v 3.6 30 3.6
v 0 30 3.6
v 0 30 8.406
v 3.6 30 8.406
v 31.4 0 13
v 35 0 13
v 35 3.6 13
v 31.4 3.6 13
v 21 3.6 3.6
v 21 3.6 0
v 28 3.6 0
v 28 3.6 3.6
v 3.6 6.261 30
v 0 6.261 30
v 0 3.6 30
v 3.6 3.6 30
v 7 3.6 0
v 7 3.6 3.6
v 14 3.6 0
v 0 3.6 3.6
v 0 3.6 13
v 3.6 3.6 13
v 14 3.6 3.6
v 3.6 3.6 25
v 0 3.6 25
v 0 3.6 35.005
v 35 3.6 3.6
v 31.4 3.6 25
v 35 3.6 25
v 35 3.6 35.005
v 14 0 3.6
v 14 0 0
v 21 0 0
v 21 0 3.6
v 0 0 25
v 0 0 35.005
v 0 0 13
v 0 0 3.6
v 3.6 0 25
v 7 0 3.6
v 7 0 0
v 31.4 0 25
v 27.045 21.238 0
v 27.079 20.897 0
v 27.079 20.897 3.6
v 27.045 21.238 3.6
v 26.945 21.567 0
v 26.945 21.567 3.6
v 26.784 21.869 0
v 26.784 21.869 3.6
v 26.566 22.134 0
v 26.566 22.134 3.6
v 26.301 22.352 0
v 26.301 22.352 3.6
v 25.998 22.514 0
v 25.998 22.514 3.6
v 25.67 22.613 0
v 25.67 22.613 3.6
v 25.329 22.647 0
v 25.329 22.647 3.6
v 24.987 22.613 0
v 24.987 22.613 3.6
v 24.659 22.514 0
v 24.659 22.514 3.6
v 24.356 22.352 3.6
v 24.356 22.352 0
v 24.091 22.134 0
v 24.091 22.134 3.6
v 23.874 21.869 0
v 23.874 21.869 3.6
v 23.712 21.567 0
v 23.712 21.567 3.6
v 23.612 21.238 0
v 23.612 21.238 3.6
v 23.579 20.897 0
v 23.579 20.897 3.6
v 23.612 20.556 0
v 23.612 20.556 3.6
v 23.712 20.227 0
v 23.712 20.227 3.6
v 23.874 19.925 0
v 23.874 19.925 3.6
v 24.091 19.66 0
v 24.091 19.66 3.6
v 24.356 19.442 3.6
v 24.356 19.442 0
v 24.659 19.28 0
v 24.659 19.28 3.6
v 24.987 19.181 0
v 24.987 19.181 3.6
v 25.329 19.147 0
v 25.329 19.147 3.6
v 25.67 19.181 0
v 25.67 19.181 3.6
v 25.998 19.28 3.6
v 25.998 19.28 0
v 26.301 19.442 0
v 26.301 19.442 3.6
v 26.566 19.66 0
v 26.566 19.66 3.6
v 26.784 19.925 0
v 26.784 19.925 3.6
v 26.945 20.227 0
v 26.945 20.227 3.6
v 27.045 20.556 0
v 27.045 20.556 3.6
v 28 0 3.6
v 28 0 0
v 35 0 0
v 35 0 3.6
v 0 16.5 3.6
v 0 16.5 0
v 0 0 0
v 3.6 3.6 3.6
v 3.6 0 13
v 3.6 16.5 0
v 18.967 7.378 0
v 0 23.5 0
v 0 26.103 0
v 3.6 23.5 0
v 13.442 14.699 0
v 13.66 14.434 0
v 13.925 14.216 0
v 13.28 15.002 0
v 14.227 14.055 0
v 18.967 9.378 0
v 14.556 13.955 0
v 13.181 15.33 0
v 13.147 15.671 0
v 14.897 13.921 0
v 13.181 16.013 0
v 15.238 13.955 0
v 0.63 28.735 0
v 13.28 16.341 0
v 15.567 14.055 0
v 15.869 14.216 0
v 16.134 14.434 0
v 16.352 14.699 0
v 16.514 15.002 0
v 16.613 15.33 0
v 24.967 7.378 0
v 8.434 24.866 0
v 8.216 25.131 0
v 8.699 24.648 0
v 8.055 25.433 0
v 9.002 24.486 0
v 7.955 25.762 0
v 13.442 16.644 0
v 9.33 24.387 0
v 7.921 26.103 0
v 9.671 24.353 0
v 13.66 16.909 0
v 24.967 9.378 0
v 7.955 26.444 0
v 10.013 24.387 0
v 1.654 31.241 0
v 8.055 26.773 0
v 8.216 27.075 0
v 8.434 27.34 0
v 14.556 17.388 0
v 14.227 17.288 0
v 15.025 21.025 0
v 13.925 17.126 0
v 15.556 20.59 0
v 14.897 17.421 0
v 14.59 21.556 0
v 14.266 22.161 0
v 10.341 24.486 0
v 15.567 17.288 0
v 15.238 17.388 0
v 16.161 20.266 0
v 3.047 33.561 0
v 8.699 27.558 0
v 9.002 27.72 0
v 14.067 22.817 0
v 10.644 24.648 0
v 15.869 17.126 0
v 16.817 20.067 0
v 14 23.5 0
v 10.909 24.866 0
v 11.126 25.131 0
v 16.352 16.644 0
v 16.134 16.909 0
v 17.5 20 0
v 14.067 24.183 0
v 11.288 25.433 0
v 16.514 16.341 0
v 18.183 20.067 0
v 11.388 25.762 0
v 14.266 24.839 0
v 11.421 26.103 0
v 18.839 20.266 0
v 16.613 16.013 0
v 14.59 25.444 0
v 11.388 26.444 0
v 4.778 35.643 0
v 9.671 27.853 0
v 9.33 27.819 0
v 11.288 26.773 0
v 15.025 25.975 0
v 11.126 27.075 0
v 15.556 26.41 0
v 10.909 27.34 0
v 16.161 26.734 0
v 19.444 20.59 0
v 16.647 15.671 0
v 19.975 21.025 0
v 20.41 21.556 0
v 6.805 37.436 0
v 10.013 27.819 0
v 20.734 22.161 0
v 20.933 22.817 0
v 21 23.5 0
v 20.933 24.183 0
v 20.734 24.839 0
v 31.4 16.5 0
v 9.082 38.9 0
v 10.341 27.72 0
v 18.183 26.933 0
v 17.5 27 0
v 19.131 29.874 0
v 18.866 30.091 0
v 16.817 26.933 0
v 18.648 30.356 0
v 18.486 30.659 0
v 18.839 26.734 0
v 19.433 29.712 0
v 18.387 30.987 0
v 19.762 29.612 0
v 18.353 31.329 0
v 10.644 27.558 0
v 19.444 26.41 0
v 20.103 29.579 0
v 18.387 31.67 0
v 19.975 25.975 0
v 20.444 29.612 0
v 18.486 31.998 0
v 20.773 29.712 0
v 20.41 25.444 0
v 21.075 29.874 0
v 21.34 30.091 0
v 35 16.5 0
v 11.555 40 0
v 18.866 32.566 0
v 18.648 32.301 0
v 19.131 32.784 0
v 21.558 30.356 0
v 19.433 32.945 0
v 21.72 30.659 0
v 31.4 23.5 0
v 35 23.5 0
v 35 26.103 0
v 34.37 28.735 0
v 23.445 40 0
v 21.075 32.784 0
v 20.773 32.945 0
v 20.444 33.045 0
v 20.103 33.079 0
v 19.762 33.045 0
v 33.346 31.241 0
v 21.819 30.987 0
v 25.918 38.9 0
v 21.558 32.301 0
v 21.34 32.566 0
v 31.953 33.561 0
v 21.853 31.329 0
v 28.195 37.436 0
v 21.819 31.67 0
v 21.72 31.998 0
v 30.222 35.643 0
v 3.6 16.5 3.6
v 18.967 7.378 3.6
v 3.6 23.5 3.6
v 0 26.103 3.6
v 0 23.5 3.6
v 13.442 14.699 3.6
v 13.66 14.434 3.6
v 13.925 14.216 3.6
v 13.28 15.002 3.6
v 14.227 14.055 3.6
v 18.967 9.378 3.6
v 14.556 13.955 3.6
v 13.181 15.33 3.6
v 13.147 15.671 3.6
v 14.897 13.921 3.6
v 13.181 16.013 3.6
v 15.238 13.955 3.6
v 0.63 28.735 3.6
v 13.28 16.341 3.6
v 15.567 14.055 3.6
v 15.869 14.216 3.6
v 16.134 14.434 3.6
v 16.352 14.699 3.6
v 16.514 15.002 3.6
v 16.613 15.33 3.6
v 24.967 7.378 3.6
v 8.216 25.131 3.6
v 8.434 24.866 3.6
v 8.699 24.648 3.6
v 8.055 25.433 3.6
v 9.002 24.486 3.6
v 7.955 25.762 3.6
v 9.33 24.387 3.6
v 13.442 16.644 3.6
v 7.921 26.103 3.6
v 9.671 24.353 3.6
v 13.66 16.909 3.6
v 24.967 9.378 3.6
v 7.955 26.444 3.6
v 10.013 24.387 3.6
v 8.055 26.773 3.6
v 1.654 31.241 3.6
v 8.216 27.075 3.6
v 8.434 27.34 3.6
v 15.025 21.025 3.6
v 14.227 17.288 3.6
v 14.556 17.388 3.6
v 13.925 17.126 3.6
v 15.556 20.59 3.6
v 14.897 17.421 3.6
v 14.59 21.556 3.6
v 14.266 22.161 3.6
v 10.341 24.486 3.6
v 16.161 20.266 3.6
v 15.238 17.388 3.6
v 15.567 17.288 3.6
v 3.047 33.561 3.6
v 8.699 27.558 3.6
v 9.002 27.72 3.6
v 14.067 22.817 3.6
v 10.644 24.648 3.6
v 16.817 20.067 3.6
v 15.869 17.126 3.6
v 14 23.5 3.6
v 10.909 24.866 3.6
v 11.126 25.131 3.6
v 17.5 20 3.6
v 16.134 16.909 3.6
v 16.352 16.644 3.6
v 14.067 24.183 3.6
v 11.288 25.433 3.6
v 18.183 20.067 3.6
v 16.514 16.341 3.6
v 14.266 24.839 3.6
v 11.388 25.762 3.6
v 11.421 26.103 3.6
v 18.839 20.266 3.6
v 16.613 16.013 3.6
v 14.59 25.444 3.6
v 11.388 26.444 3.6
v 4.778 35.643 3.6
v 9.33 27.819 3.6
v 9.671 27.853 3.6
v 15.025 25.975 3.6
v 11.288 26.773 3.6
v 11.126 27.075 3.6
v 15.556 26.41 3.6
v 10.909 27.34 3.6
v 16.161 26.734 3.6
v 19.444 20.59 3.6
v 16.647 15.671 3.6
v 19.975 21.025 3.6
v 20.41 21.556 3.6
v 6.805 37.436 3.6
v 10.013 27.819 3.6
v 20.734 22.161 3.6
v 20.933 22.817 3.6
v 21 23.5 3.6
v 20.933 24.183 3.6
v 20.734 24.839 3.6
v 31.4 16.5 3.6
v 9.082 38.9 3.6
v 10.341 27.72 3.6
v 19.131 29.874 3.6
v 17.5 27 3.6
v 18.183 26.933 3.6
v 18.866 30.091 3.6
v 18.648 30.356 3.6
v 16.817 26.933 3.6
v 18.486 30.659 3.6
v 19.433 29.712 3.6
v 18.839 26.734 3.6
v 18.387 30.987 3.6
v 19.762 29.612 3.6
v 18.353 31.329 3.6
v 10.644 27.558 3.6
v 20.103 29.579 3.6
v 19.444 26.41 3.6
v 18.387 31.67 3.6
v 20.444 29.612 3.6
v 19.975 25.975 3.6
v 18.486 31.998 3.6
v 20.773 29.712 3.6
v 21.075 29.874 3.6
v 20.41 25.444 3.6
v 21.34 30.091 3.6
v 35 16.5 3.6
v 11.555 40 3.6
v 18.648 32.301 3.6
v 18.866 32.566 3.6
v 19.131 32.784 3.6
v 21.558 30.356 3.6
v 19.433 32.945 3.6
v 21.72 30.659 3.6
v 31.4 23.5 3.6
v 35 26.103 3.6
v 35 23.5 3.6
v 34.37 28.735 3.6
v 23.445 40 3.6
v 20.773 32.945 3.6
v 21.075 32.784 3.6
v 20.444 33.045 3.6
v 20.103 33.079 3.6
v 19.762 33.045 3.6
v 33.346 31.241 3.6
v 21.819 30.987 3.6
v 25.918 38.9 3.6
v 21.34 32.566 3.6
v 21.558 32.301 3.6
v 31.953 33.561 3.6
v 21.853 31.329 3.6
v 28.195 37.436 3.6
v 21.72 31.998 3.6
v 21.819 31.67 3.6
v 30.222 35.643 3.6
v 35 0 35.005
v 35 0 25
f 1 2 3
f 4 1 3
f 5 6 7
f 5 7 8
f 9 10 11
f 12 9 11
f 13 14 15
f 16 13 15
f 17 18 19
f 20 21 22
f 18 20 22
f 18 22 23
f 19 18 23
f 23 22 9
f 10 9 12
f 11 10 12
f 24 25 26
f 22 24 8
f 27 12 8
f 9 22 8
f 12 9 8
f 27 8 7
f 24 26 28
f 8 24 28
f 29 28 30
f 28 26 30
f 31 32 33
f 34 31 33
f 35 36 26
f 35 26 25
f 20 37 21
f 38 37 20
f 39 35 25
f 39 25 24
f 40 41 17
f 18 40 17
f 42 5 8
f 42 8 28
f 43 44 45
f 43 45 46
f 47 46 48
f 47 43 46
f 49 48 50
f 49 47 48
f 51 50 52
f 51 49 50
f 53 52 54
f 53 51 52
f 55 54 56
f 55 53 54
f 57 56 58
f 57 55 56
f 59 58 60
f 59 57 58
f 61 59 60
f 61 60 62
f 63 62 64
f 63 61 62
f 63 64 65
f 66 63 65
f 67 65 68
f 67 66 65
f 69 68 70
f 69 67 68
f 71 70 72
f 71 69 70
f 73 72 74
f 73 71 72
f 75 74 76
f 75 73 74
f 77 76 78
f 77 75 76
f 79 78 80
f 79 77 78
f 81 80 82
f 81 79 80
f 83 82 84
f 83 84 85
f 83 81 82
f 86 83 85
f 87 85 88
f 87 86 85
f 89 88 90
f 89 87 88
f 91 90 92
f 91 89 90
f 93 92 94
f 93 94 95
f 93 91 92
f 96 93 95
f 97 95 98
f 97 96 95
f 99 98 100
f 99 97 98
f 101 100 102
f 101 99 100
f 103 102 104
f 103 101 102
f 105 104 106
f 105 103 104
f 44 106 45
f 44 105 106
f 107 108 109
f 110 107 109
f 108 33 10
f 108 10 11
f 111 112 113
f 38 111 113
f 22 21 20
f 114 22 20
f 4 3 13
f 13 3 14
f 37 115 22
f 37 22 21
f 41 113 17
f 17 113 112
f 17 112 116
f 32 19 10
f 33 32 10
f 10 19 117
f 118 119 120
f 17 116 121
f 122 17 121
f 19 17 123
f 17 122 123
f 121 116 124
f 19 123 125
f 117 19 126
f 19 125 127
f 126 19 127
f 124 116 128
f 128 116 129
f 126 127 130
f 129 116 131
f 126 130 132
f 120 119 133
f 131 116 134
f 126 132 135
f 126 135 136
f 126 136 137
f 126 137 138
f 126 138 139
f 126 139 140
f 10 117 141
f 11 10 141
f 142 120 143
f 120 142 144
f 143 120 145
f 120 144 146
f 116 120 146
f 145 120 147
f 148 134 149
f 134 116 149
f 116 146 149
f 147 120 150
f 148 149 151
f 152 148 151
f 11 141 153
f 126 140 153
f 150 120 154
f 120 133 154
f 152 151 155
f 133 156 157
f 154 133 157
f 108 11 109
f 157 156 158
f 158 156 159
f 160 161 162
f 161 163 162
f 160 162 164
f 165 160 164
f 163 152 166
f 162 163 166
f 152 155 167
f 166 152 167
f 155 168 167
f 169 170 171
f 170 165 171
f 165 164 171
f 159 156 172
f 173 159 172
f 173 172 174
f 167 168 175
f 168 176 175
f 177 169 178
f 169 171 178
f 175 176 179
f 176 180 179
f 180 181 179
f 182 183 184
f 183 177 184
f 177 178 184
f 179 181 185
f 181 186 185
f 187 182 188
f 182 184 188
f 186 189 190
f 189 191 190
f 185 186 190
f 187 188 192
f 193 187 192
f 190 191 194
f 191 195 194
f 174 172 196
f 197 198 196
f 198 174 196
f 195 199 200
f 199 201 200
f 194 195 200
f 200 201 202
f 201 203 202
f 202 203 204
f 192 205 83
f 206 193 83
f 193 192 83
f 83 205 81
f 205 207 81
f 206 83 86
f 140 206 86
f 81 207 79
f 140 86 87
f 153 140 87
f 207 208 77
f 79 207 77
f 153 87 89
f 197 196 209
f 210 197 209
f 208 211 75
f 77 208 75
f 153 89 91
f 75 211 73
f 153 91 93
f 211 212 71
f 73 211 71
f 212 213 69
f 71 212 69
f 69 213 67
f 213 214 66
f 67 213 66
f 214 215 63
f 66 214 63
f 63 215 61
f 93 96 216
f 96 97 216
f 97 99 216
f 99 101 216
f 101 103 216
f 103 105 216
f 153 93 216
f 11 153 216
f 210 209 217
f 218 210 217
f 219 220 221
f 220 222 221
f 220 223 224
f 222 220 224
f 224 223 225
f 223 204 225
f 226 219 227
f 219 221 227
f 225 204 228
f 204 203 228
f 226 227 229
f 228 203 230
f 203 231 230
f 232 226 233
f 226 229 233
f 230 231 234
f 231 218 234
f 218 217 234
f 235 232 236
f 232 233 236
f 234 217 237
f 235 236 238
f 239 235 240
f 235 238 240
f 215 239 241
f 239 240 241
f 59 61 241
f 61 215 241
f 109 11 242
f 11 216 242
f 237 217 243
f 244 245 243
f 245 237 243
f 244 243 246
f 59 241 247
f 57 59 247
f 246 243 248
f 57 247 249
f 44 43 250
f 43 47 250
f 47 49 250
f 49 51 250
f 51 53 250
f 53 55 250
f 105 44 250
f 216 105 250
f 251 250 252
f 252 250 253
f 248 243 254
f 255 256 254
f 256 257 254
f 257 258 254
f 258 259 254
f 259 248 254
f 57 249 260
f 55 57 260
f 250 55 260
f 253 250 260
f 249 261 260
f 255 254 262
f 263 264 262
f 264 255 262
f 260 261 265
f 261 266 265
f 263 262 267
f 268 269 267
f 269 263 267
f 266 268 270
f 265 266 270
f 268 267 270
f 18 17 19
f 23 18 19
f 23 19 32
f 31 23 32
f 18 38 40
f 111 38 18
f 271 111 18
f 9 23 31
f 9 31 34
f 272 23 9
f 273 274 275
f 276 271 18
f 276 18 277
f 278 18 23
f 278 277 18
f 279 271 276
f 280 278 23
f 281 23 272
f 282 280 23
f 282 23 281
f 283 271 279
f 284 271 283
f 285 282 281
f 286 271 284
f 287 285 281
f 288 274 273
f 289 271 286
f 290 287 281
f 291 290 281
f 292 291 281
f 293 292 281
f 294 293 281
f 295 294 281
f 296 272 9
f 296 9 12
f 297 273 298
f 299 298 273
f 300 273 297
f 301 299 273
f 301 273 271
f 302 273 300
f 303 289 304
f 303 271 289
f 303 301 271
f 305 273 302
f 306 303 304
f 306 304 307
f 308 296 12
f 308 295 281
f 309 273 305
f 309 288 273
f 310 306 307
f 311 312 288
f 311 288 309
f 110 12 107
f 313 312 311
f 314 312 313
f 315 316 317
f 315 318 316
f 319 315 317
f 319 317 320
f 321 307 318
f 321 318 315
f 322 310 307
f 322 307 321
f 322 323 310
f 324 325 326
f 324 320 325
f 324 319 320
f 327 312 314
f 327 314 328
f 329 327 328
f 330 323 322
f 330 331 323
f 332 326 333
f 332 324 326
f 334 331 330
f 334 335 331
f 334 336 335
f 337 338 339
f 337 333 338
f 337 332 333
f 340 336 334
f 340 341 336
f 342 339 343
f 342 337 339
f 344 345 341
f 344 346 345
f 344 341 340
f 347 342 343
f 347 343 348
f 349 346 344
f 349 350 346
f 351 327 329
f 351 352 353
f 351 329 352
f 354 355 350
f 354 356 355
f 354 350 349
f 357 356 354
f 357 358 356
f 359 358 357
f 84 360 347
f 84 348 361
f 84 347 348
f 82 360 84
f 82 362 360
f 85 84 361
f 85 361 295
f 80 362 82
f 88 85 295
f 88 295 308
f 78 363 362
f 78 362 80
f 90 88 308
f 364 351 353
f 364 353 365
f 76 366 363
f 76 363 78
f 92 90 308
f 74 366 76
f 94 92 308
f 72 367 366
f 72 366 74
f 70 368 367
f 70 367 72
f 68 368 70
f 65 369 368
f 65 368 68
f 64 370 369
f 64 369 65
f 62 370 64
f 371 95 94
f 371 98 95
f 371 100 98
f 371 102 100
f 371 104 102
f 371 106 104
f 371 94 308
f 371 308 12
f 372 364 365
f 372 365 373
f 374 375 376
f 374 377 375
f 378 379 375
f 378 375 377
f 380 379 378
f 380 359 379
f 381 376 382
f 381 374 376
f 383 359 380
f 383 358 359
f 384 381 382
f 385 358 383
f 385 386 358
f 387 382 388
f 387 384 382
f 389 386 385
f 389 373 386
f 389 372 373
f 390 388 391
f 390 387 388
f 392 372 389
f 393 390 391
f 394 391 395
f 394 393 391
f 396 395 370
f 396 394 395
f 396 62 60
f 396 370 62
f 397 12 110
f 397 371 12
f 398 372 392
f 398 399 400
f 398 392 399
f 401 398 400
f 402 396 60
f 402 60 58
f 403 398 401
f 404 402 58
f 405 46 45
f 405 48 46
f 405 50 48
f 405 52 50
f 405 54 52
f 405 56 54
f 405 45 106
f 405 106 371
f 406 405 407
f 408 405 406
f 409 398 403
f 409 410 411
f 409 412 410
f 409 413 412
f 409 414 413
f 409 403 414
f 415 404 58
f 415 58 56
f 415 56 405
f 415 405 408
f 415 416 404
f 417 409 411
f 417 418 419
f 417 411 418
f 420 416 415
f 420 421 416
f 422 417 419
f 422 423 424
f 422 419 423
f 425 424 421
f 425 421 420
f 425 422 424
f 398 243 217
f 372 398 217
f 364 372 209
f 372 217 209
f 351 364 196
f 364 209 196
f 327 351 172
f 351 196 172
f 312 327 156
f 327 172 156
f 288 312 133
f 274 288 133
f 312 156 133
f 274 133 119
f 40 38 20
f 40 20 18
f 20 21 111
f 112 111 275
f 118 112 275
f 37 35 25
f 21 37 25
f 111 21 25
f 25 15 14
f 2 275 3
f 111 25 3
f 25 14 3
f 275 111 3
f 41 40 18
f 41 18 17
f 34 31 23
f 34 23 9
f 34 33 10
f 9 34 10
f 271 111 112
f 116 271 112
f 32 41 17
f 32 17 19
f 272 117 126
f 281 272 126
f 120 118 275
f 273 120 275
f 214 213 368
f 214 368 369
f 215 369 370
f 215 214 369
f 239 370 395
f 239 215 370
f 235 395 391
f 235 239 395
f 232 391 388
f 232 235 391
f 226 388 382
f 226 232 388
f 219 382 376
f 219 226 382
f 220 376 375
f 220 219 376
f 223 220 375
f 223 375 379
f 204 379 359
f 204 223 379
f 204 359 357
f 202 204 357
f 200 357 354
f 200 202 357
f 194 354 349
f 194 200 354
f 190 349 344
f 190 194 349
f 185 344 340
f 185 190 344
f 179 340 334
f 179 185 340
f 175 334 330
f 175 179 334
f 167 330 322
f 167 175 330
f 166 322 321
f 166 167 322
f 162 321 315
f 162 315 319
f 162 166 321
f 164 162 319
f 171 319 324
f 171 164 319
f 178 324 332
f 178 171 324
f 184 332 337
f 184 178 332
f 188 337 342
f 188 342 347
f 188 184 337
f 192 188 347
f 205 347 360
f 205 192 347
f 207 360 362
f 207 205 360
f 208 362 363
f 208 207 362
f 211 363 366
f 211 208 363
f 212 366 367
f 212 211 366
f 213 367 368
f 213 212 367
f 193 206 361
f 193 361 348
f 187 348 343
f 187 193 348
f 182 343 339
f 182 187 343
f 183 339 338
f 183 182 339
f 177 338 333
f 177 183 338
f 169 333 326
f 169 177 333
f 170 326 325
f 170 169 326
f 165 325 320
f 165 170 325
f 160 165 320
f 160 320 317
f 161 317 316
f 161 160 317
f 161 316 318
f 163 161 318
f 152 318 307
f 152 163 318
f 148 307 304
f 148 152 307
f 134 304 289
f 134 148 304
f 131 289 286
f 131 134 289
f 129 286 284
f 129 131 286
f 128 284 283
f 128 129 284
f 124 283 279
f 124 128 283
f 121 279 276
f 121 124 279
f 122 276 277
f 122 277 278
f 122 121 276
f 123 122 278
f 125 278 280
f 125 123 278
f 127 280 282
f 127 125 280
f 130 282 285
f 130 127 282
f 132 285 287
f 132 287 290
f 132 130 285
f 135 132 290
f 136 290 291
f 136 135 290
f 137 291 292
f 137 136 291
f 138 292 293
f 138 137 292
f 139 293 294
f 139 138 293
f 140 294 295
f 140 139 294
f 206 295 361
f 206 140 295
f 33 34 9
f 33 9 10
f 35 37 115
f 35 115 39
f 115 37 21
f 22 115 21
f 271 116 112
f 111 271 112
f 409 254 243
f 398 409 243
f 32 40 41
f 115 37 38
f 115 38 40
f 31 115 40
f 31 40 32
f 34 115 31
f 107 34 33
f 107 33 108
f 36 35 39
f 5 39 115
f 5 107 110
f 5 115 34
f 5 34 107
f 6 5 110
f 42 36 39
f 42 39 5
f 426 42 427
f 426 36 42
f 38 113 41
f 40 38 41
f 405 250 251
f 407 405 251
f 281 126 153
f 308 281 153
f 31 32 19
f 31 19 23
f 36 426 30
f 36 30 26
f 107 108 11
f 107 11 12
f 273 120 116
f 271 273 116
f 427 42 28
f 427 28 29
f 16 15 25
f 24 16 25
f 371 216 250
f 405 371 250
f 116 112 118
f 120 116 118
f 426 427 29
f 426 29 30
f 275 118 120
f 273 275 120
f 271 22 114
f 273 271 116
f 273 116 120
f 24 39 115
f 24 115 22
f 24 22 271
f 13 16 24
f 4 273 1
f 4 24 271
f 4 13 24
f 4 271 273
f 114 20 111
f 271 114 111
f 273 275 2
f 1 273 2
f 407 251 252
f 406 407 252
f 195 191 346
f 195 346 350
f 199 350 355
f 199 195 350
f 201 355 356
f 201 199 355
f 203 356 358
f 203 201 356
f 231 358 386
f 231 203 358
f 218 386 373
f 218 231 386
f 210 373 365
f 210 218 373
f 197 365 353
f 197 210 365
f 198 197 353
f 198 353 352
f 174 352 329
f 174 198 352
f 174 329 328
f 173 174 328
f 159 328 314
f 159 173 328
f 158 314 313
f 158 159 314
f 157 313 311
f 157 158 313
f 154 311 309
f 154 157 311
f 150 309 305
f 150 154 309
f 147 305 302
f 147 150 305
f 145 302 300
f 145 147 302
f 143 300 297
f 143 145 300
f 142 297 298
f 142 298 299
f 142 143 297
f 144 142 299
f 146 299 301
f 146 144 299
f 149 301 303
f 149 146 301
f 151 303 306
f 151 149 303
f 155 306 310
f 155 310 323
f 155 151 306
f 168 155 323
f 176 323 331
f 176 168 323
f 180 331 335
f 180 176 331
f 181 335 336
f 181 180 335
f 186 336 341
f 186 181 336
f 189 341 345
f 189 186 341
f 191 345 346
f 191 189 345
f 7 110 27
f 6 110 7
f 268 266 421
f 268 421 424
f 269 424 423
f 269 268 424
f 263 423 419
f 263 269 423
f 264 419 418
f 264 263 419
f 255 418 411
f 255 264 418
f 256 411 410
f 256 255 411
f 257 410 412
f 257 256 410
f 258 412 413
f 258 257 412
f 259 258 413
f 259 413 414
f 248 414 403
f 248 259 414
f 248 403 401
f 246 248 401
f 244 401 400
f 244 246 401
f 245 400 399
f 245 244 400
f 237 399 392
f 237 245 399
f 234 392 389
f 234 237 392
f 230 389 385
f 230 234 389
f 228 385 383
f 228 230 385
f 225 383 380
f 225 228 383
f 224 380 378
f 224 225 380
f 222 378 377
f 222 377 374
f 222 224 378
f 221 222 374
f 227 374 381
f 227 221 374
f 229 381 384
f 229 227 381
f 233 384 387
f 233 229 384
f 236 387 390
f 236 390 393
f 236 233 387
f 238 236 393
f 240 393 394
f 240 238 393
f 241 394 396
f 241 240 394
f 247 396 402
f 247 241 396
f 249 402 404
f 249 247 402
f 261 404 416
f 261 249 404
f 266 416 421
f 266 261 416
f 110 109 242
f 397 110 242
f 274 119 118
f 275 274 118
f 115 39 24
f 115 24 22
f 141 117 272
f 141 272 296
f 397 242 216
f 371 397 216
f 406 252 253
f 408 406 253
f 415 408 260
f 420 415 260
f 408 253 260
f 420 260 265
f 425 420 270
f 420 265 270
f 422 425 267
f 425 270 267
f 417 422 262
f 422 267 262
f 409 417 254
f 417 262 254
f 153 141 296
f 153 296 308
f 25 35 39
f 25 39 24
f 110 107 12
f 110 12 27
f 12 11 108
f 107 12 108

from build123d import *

# Parameters (mm, degrees)
F2_DEPTH = 3.6
F0_R     = 1.75
F0_W     = 6
F0_H     = 2
F0_R_2   = 3.5
F3_DEPTH = 3.6
F4_W     = 3.6
F4_H     = 12
F5_DEPTH = 3.6


with BuildPart() as f2:
    # F1 (on Front) → F2 (new body)
    with BuildSketch(Plane.XZ):
        Polygon((35, 35.005142), (0, 35.005142), (0, 25), (3.6, 25), (3.6, 13), (0, 13), (0, 3.6), (7, 3.6), (7, 0), (14, 0), (14, 3.6), (21, 3.6), (21, 0), (28, 0), (28, 3.6), (35, 3.6), (35, 13), (31.4, 13), (31.4, 25), (35, 25), align=None)
    extrude(amount=-F2_DEPTH)


with BuildPart() as f3:
    # F0 (on Top) → F3 (new body)
    with BuildSketch(Plane.XY):
        with BuildLine():
            Line((0, 16.5), (0, 0))
            Line((0, 0), (7, 0))
            Line((7, 0), (7, 3.6))
            Line((7, 3.6), (14, 3.6))
            Line((14, 3.6), (14, 0))
            Line((14, 0), (21, 0))
            Line((21, 0), (21, 3.6))
            Line((21, 3.6), (28, 3.6))
            Line((28, 3.6), (28, 0))
            Line((28, 0), (35, 0))
            Line((35, 0), (35, 16.5))
            Line((35, 16.5), (31.4, 16.5))
            Line((31.4, 16.5), (31.4, 23.5))
            Line((31.4, 23.5), (35, 23.5))
            Line((35, 23.5), (35, 26.103048))
            ThreePointArc((35, 26.103048), (31.127292, 34.635091), (23.445406, 40))
            Line((23.445406, 40), (11.554594, 40))
            ThreePointArc((11.554594, 40), (3.872708, 34.635091), (0, 26.103048))
            Line((0, 26.103048), (0, 23.5))
            Line((0, 23.5), (3.6, 23.5))
            Line((3.6, 23.5), (3.6, 16.5))
            Line((3.6, 16.5), (0, 16.5))
        make_face()
        with Locations((14.896952, 15.671421)):
            Circle(F0_R, mode=Mode.SUBTRACT)
        with Locations((21.966932, 8.378327)):
            Rectangle(F0_W, F0_H, mode=Mode.SUBTRACT)
        with Locations((9.671421, 26.103048)):
            Circle(F0_R, mode=Mode.SUBTRACT)
        with Locations((17.5, 23.5)):
            Circle(F0_R_2, mode=Mode.SUBTRACT)
        with Locations((25.328579, 20.896952)):
            Circle(F0_R, mode=Mode.SUBTRACT)
        with Locations((20.103048, 31.328579)):
            Circle(F0_R, mode=Mode.SUBTRACT)
    extrude(amount=F3_DEPTH)


with BuildPart() as f5:
    # F4 (on Right) → F5 (new body)
    with BuildSketch(Plane.YZ):
        Polygon((6.261451, 30), (3.6, 30), (3.6, 25), (3.6, 13), (3.6, 3.6), (16.5, 3.6), (16.5, 0), (23.5, 0), (23.5, 3.6), (30, 3.6), (30, 8.405508), align=None)
        with Locations((1.8, 19)):
            Rectangle(F4_W, F4_H)
    extrude(amount=F5_DEPTH)


solid = Compound([f2.part, f3.part, f5.part])
